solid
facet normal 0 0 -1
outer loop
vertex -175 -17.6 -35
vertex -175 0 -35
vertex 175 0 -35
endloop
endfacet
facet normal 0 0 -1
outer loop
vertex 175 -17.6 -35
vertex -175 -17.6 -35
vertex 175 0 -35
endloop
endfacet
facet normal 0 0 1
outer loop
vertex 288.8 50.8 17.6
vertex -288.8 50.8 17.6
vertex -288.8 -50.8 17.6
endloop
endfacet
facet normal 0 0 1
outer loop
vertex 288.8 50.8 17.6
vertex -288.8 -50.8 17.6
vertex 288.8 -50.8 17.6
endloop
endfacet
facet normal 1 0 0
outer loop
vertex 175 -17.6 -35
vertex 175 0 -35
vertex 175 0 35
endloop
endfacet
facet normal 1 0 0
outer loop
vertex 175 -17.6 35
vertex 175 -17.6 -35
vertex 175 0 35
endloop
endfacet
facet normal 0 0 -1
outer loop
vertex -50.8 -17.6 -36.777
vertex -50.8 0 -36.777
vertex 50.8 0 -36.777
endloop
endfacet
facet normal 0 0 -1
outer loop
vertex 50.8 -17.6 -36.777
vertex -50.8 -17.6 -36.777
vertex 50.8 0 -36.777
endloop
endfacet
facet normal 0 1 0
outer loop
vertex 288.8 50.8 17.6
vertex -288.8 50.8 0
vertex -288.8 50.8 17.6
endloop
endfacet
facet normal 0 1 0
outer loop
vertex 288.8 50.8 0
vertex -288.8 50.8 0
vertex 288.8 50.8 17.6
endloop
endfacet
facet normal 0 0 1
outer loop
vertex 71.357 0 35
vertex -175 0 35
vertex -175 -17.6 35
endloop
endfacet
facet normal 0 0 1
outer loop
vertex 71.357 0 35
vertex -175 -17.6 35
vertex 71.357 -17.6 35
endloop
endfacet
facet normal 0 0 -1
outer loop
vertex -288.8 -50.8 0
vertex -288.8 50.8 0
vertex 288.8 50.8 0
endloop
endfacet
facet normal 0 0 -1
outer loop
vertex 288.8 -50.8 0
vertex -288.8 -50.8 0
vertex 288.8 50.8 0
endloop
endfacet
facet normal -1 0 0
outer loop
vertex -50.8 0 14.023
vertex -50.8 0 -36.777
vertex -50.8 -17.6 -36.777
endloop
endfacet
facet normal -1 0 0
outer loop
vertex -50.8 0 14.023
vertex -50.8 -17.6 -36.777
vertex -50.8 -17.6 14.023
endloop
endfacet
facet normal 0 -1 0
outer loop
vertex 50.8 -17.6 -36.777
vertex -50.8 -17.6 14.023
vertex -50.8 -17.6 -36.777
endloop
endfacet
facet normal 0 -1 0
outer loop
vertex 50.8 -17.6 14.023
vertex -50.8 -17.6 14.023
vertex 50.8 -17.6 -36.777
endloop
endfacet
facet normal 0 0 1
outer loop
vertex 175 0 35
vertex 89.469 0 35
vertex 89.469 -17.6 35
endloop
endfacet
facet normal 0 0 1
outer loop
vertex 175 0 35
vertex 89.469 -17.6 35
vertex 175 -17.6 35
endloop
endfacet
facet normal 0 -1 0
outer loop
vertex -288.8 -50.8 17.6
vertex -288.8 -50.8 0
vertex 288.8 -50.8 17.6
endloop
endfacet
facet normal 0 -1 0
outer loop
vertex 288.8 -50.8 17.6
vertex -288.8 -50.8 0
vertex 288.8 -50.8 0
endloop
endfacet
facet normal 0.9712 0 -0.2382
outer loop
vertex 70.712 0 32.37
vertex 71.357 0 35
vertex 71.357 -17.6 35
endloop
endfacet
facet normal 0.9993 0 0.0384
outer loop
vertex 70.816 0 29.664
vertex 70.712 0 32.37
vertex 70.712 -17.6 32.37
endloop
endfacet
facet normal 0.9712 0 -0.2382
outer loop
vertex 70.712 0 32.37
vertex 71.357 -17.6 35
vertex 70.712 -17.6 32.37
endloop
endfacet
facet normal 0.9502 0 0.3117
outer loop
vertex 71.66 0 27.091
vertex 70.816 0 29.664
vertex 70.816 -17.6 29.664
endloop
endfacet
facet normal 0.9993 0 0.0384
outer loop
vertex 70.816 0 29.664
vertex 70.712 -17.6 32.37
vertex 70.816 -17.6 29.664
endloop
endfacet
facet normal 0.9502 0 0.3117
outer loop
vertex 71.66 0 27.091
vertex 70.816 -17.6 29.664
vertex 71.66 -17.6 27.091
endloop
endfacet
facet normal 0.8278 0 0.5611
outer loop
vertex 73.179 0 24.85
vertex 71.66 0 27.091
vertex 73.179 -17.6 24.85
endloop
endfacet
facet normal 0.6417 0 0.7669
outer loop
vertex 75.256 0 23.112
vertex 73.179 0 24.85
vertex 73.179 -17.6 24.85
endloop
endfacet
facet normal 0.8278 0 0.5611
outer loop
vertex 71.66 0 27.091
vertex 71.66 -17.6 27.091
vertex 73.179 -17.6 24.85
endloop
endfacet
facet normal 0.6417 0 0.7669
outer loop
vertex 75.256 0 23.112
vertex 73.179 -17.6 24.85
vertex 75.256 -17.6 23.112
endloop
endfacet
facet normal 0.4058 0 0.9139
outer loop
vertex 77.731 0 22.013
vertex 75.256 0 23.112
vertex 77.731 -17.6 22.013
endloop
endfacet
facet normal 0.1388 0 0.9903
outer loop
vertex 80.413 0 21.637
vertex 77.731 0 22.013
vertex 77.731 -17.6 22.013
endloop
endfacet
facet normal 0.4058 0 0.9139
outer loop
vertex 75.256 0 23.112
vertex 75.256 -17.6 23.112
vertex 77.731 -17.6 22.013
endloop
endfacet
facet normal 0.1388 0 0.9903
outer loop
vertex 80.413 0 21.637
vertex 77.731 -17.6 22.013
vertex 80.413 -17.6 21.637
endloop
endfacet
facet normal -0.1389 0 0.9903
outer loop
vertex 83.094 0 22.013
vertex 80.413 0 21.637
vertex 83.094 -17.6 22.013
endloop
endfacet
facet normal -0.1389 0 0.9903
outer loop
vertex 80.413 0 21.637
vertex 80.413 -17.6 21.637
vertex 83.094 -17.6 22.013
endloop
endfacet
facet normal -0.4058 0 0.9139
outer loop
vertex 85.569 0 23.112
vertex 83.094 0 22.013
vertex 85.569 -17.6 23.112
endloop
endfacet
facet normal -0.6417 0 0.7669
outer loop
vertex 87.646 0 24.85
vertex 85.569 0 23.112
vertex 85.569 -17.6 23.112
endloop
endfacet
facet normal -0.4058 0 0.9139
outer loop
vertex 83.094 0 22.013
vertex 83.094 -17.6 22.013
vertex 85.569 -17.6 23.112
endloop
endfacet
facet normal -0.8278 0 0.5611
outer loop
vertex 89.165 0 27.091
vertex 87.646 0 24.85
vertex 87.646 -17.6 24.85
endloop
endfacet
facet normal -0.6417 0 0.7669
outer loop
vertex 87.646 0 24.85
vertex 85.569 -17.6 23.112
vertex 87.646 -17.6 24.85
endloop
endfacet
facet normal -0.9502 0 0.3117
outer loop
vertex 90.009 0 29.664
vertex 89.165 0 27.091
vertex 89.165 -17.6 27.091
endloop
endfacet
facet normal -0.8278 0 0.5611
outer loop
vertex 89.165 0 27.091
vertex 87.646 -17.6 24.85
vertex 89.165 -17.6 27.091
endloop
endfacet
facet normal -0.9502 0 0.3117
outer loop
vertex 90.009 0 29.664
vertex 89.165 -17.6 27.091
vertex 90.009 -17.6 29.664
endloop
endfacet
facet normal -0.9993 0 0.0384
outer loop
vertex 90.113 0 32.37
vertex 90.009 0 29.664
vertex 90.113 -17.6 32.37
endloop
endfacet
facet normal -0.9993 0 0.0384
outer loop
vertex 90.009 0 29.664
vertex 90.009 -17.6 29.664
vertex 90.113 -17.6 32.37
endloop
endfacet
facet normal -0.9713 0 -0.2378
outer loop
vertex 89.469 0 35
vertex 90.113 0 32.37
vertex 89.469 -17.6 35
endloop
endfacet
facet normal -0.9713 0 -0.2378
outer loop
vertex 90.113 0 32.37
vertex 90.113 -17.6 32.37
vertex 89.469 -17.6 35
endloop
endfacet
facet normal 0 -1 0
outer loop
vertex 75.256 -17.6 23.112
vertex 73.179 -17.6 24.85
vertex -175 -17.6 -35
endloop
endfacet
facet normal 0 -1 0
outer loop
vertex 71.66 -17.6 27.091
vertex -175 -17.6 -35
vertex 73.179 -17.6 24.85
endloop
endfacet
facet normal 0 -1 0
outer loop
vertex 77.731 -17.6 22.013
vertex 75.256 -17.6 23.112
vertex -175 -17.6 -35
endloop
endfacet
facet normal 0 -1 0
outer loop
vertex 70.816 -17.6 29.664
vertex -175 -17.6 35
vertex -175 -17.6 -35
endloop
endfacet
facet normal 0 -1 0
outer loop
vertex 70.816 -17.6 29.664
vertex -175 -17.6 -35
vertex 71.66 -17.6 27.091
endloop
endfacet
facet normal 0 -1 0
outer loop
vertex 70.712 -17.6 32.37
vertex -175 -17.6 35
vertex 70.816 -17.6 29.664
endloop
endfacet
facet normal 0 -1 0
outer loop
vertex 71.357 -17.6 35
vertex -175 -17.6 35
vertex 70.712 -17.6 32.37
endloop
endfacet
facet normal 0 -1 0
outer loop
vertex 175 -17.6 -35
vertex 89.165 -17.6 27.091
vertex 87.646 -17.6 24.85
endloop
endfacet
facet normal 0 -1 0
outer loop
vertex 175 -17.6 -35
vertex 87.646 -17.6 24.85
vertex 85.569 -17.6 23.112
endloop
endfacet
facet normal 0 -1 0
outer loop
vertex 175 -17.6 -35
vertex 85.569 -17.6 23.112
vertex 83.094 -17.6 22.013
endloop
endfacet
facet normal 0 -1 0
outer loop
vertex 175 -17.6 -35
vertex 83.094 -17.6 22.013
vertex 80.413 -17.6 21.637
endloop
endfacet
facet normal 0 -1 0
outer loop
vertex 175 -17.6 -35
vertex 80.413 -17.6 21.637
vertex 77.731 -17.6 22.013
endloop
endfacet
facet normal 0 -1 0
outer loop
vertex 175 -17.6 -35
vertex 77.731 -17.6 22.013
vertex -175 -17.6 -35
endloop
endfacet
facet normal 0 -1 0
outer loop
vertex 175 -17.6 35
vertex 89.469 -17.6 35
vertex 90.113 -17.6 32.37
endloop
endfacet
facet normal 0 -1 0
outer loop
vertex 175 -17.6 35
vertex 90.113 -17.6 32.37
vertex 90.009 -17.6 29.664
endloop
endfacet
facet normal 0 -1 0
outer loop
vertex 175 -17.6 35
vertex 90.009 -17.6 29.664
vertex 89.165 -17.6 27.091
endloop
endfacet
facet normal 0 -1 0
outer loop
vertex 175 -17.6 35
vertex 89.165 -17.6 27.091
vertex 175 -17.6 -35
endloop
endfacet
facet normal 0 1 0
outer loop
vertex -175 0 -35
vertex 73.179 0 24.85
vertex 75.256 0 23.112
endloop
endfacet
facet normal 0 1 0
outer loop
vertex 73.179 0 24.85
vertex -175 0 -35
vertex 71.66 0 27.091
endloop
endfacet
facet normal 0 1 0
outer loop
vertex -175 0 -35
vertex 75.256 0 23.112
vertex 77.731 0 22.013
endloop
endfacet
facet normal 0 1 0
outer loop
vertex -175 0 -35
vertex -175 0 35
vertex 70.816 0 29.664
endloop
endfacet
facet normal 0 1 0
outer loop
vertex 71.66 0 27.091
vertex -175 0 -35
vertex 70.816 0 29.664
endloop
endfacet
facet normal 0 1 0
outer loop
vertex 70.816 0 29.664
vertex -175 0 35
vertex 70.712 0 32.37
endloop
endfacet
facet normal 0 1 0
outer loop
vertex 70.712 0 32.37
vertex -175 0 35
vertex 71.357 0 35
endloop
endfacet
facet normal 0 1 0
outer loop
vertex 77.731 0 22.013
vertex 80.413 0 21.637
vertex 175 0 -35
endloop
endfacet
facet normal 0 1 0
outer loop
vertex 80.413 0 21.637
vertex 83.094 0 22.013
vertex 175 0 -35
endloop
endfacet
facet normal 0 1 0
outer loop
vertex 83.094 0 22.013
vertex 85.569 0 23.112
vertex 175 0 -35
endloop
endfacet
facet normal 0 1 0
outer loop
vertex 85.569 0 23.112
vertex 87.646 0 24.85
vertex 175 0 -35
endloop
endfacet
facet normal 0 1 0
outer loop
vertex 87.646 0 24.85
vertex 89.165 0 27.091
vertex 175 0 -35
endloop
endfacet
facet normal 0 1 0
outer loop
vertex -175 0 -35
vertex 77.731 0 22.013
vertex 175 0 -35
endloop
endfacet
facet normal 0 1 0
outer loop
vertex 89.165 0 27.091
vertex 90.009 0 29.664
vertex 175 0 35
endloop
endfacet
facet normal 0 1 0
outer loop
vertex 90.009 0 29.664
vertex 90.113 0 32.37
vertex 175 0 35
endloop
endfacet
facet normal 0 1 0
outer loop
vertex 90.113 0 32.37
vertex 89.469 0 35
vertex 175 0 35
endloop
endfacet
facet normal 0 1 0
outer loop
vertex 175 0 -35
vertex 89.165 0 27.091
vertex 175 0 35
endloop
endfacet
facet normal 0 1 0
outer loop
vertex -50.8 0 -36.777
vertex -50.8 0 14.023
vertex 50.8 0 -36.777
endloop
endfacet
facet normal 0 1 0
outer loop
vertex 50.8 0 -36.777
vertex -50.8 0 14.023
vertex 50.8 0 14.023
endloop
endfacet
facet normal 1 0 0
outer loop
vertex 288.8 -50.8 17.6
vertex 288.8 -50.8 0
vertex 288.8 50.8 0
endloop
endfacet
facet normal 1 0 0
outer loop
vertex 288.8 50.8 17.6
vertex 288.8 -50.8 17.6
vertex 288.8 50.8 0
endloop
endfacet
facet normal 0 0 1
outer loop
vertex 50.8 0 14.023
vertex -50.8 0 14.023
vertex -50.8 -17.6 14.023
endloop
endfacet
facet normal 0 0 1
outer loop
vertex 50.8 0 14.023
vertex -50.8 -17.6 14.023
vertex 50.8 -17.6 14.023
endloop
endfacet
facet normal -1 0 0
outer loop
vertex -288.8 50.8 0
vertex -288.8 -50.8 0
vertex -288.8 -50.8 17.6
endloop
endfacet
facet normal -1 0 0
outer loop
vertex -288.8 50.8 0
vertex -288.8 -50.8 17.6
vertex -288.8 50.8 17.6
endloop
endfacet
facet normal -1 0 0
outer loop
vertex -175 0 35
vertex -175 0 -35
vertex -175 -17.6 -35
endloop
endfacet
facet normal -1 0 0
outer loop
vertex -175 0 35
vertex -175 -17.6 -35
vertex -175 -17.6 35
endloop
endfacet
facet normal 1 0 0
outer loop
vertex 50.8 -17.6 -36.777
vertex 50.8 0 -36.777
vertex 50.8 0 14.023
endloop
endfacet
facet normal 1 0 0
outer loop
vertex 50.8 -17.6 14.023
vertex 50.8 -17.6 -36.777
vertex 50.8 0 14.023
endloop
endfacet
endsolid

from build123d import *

# Parameters (mm, degrees)
F0_W     = 350
F0_H     = 70
F1_DEPTH = 17.6
F2_R     = 9.75
F3_DEPTH = 17.6
F4_W     = 101.6
F4_H     = 50.8
F5_DEPTH = 17.6
F6_W     = 577.6
F6_H     = 101.6
F7_DEPTH = 17.6


with BuildPart() as f1:
    # F0 (on Front) → F1 (new body)
    with BuildSketch(Plane.XZ):
        Rectangle(F0_W, F0_H)
    extrude(amount=F1_DEPTH)

    # F2 (on face) → F3 (cut)
    with BuildSketch(Plane.XZ.offset(17.6)):
        with Locations((80.412671, 31.38715)):
            Circle(F2_R)
    extrude(amount=-F3_DEPTH, mode=Mode.SUBTRACT)


with BuildPart() as f5:
    # F4 (on Front) → F5 (new body)
    with BuildSketch(Plane.XZ):
        with Locations((0, -11.37708)):
            Rectangle(F4_W, F4_H)
    extrude(amount=F5_DEPTH)


with BuildPart() as f7:
    # F6 (on Top) → F7 (new body)
    with BuildSketch(Plane.XY):
        Rectangle(F6_W, F6_H)
    extrude(amount=F7_DEPTH)


solid = Compound([f1.part, f5.part, f7.part])
